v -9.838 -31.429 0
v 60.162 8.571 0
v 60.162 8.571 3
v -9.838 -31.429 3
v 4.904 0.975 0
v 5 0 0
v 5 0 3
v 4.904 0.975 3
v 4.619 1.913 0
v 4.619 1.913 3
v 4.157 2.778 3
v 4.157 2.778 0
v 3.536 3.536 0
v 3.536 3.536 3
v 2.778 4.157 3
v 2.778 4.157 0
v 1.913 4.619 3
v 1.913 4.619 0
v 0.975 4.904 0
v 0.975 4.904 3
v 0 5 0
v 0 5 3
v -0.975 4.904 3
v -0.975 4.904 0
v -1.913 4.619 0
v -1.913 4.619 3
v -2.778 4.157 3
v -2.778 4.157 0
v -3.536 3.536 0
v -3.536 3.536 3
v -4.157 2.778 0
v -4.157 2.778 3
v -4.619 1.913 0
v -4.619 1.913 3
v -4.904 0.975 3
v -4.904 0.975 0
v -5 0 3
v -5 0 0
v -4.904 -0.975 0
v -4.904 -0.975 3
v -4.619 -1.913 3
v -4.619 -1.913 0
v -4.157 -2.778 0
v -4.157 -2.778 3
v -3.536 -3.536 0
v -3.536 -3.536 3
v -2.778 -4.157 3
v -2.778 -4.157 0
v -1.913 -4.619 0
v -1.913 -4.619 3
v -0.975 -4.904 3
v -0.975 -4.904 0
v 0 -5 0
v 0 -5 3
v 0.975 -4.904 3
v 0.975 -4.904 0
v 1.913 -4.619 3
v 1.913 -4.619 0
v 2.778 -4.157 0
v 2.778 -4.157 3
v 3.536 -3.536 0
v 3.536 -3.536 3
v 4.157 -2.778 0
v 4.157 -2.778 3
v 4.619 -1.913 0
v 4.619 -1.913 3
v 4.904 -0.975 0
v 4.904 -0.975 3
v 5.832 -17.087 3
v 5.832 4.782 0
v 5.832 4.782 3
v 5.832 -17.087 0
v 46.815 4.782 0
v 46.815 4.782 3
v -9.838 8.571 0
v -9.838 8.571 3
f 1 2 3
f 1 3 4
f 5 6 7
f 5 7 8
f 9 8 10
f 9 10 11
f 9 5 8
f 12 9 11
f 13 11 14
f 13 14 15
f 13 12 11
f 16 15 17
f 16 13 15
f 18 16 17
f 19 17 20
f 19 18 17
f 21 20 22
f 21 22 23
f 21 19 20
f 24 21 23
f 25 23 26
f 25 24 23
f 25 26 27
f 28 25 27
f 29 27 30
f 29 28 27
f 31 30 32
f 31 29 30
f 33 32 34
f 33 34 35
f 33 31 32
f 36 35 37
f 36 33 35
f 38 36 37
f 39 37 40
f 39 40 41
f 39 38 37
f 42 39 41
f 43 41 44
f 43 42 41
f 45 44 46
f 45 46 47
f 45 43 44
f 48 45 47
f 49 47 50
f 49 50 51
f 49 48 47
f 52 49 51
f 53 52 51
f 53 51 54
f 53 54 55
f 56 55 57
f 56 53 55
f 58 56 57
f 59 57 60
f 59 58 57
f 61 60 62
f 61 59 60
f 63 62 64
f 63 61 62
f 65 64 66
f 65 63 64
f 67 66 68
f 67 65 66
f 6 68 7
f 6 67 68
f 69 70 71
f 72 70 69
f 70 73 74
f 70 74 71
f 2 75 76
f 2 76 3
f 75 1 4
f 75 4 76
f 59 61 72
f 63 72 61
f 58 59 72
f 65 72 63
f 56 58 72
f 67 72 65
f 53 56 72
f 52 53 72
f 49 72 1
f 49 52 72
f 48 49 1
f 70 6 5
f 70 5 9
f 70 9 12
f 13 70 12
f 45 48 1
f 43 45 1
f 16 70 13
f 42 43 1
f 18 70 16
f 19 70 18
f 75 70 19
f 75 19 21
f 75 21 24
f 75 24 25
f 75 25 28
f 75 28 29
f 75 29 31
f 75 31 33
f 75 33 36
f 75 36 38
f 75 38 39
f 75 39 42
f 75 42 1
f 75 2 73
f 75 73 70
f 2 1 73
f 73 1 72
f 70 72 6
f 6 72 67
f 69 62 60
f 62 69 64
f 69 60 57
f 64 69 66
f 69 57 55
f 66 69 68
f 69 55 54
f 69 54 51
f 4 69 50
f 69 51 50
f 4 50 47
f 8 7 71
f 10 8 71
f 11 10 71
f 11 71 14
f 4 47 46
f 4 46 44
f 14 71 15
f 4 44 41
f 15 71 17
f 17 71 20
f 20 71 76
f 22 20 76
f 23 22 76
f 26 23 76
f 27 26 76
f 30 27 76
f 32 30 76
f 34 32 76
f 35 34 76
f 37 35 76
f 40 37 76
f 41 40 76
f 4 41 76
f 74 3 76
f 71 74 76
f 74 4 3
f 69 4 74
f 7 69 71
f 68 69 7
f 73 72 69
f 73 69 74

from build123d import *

# Parameters (mm, degrees)
SKETCH_1_R      = 5
EXTRUDE_1_DEPTH = 3


with BuildPart() as part:
    # 草图1 → 凸台-拉伸1 (new body)
    with BuildSketch(Plane.XY):
        Polygon((-9.837963803, 8.570517693), (60.162036197, 8.570517693), (-9.837963803, -31.429482307), align=None)
        Circle(SKETCH_1_R, mode=Mode.SUBTRACT)
        Polygon((5.831882272, 4.782203257), (5.831882272, -17.086702804), (46.814556623, 4.782203257), align=None, mode=Mode.SUBTRACT)
    extrude(amount=EXTRUDE_1_DEPTH)


solid = part.part
